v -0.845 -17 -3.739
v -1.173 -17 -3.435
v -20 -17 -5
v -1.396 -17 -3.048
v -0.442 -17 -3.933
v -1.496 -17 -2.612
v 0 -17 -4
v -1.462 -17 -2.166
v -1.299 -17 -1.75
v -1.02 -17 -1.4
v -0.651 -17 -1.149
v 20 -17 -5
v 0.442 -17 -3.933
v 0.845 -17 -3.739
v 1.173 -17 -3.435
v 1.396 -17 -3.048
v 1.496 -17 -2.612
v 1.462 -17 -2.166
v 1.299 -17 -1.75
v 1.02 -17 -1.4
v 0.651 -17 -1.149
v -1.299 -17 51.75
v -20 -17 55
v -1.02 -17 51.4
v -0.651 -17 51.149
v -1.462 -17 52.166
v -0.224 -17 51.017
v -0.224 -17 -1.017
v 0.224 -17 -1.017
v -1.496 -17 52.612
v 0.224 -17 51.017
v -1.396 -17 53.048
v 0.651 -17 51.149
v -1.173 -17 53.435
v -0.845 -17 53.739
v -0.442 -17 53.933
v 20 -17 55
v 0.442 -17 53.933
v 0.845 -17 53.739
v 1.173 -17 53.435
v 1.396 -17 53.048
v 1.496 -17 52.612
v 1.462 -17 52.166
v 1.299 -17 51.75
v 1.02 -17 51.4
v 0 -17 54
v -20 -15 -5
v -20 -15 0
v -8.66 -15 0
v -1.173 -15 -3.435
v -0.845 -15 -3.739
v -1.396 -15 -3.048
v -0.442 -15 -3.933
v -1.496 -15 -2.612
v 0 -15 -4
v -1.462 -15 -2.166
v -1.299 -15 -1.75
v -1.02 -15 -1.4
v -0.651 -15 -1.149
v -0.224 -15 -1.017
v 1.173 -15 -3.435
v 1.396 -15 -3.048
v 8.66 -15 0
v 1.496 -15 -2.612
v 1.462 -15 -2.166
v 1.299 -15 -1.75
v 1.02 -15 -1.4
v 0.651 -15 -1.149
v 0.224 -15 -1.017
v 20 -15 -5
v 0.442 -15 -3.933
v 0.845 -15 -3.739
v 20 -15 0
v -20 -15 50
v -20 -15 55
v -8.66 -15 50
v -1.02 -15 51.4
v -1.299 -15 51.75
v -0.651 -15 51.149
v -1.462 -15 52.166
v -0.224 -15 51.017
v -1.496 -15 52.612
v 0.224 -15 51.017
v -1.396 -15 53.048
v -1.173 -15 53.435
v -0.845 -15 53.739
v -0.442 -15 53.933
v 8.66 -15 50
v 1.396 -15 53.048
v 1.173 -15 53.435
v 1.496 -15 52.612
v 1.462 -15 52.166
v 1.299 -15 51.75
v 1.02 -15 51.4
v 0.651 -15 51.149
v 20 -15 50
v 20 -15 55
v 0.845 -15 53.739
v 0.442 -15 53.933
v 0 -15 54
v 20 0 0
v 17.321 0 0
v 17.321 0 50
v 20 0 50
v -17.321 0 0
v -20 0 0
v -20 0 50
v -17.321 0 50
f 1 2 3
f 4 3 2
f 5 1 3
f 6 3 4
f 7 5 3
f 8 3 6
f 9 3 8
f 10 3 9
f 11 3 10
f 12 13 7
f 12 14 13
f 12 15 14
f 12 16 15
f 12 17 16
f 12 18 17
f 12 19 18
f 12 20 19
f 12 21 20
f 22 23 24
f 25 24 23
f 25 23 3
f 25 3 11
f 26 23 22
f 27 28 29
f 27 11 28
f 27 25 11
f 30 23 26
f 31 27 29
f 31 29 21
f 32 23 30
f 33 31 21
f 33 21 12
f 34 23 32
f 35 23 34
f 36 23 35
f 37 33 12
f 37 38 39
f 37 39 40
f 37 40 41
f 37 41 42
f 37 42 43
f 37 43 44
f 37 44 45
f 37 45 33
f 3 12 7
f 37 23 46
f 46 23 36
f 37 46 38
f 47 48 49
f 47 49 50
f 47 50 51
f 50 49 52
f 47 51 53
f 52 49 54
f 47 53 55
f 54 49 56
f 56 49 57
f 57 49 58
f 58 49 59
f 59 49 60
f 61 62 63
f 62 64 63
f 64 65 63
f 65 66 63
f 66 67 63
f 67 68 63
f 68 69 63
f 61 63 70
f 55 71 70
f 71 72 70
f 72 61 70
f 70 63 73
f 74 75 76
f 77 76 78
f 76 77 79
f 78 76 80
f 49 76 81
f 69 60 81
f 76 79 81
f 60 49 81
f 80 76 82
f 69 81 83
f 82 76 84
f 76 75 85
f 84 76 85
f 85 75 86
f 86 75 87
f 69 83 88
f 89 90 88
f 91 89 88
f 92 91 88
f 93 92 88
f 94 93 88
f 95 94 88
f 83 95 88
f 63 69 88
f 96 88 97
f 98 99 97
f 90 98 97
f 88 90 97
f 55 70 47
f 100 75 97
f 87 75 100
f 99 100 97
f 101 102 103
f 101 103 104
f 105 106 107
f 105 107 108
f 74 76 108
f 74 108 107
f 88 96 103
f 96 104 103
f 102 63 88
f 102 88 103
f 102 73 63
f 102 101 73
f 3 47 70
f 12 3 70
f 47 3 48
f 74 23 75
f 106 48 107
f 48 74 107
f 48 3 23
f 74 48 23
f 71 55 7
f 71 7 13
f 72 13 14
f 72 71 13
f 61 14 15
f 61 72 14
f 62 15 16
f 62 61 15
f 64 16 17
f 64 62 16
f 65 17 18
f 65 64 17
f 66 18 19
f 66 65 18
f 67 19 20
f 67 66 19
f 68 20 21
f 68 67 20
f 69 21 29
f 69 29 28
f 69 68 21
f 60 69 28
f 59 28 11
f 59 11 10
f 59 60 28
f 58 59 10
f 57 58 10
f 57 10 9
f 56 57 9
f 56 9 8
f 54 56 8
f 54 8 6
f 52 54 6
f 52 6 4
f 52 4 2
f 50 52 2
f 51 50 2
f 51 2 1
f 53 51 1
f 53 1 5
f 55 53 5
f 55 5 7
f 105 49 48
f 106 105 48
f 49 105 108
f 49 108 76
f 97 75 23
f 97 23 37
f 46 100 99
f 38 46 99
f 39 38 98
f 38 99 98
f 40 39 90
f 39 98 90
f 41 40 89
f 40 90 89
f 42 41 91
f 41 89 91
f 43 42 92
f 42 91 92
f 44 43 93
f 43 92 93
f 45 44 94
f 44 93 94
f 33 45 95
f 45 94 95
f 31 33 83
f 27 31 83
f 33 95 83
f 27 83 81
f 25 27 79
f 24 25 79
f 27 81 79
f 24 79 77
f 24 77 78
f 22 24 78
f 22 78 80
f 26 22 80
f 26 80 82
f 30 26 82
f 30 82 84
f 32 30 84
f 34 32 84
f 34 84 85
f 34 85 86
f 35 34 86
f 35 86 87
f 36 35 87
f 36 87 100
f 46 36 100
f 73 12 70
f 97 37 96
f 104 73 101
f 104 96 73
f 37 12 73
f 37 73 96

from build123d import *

# Parameters (mm, degrees)
BOSS_EXTRUDE1_DEPTH = 50
SKETCH3_W           = 40
SKETCH3_H           = 2
BOSS_EXTRUDE2_DEPTH = 5
CUT_EXTRUDE1_REACH  = 62.415
SKETCH4_R           = 1.5


with BuildPart() as part:
    # Sketch1 → Boss-Extrude1 (new body)
    with BuildSketch(Plane.XY):
        Polygon((8.660254038, -15), (17.320508076, 0), (20, 0), (20, -17), (-20, -17), (-20, 0), (-17.320508076, 0), (-8.660254038, -15), align=None)
    extrude(amount=BOSS_EXTRUDE1_DEPTH)

    # Sketch3 → Boss-Extrude2 (add)
    with BuildSketch(Plane.XY.offset(50)):
        with Locations((0, -16)):
            Rectangle(SKETCH3_W, SKETCH3_H)
    boss_extrude2 = extrude(amount=BOSS_EXTRUDE2_DEPTH)

    # Sketch4 → Cut-Extrude1 (cut, up to next)
    with BuildSketch(Plane(origin=(0, -15, 0), x_dir=(1, 0, 0), z_dir=(0, 1, 0)), mode=Mode.PRIVATE) as cut_extrude1_sk1:
        with Locations(Location((0, -52.5, 0), (0, 0, 270))):
            Circle(SKETCH4_R)
    cut_extrude1_tool1 = extrude(cut_extrude1_sk1.sketch, amount=-CUT_EXTRUDE1_REACH, mode=Mode.PRIVATE) & part.part
    cut_extrude1 = cut_extrude1_tool1.solids().sort_by_distance((0, -15, 52.5))[0]
    add(cut_extrude1, mode=Mode.SUBTRACT)

    # Mirror1: Boss-Extrude2, Cut-Extrude1 across plane
    add(boss_extrude2.mirror(Plane.XY.offset(25)))
    add(cut_extrude1.mirror(Plane.XY.offset(25)), mode=Mode.SUBTRACT)


solid = part.part
